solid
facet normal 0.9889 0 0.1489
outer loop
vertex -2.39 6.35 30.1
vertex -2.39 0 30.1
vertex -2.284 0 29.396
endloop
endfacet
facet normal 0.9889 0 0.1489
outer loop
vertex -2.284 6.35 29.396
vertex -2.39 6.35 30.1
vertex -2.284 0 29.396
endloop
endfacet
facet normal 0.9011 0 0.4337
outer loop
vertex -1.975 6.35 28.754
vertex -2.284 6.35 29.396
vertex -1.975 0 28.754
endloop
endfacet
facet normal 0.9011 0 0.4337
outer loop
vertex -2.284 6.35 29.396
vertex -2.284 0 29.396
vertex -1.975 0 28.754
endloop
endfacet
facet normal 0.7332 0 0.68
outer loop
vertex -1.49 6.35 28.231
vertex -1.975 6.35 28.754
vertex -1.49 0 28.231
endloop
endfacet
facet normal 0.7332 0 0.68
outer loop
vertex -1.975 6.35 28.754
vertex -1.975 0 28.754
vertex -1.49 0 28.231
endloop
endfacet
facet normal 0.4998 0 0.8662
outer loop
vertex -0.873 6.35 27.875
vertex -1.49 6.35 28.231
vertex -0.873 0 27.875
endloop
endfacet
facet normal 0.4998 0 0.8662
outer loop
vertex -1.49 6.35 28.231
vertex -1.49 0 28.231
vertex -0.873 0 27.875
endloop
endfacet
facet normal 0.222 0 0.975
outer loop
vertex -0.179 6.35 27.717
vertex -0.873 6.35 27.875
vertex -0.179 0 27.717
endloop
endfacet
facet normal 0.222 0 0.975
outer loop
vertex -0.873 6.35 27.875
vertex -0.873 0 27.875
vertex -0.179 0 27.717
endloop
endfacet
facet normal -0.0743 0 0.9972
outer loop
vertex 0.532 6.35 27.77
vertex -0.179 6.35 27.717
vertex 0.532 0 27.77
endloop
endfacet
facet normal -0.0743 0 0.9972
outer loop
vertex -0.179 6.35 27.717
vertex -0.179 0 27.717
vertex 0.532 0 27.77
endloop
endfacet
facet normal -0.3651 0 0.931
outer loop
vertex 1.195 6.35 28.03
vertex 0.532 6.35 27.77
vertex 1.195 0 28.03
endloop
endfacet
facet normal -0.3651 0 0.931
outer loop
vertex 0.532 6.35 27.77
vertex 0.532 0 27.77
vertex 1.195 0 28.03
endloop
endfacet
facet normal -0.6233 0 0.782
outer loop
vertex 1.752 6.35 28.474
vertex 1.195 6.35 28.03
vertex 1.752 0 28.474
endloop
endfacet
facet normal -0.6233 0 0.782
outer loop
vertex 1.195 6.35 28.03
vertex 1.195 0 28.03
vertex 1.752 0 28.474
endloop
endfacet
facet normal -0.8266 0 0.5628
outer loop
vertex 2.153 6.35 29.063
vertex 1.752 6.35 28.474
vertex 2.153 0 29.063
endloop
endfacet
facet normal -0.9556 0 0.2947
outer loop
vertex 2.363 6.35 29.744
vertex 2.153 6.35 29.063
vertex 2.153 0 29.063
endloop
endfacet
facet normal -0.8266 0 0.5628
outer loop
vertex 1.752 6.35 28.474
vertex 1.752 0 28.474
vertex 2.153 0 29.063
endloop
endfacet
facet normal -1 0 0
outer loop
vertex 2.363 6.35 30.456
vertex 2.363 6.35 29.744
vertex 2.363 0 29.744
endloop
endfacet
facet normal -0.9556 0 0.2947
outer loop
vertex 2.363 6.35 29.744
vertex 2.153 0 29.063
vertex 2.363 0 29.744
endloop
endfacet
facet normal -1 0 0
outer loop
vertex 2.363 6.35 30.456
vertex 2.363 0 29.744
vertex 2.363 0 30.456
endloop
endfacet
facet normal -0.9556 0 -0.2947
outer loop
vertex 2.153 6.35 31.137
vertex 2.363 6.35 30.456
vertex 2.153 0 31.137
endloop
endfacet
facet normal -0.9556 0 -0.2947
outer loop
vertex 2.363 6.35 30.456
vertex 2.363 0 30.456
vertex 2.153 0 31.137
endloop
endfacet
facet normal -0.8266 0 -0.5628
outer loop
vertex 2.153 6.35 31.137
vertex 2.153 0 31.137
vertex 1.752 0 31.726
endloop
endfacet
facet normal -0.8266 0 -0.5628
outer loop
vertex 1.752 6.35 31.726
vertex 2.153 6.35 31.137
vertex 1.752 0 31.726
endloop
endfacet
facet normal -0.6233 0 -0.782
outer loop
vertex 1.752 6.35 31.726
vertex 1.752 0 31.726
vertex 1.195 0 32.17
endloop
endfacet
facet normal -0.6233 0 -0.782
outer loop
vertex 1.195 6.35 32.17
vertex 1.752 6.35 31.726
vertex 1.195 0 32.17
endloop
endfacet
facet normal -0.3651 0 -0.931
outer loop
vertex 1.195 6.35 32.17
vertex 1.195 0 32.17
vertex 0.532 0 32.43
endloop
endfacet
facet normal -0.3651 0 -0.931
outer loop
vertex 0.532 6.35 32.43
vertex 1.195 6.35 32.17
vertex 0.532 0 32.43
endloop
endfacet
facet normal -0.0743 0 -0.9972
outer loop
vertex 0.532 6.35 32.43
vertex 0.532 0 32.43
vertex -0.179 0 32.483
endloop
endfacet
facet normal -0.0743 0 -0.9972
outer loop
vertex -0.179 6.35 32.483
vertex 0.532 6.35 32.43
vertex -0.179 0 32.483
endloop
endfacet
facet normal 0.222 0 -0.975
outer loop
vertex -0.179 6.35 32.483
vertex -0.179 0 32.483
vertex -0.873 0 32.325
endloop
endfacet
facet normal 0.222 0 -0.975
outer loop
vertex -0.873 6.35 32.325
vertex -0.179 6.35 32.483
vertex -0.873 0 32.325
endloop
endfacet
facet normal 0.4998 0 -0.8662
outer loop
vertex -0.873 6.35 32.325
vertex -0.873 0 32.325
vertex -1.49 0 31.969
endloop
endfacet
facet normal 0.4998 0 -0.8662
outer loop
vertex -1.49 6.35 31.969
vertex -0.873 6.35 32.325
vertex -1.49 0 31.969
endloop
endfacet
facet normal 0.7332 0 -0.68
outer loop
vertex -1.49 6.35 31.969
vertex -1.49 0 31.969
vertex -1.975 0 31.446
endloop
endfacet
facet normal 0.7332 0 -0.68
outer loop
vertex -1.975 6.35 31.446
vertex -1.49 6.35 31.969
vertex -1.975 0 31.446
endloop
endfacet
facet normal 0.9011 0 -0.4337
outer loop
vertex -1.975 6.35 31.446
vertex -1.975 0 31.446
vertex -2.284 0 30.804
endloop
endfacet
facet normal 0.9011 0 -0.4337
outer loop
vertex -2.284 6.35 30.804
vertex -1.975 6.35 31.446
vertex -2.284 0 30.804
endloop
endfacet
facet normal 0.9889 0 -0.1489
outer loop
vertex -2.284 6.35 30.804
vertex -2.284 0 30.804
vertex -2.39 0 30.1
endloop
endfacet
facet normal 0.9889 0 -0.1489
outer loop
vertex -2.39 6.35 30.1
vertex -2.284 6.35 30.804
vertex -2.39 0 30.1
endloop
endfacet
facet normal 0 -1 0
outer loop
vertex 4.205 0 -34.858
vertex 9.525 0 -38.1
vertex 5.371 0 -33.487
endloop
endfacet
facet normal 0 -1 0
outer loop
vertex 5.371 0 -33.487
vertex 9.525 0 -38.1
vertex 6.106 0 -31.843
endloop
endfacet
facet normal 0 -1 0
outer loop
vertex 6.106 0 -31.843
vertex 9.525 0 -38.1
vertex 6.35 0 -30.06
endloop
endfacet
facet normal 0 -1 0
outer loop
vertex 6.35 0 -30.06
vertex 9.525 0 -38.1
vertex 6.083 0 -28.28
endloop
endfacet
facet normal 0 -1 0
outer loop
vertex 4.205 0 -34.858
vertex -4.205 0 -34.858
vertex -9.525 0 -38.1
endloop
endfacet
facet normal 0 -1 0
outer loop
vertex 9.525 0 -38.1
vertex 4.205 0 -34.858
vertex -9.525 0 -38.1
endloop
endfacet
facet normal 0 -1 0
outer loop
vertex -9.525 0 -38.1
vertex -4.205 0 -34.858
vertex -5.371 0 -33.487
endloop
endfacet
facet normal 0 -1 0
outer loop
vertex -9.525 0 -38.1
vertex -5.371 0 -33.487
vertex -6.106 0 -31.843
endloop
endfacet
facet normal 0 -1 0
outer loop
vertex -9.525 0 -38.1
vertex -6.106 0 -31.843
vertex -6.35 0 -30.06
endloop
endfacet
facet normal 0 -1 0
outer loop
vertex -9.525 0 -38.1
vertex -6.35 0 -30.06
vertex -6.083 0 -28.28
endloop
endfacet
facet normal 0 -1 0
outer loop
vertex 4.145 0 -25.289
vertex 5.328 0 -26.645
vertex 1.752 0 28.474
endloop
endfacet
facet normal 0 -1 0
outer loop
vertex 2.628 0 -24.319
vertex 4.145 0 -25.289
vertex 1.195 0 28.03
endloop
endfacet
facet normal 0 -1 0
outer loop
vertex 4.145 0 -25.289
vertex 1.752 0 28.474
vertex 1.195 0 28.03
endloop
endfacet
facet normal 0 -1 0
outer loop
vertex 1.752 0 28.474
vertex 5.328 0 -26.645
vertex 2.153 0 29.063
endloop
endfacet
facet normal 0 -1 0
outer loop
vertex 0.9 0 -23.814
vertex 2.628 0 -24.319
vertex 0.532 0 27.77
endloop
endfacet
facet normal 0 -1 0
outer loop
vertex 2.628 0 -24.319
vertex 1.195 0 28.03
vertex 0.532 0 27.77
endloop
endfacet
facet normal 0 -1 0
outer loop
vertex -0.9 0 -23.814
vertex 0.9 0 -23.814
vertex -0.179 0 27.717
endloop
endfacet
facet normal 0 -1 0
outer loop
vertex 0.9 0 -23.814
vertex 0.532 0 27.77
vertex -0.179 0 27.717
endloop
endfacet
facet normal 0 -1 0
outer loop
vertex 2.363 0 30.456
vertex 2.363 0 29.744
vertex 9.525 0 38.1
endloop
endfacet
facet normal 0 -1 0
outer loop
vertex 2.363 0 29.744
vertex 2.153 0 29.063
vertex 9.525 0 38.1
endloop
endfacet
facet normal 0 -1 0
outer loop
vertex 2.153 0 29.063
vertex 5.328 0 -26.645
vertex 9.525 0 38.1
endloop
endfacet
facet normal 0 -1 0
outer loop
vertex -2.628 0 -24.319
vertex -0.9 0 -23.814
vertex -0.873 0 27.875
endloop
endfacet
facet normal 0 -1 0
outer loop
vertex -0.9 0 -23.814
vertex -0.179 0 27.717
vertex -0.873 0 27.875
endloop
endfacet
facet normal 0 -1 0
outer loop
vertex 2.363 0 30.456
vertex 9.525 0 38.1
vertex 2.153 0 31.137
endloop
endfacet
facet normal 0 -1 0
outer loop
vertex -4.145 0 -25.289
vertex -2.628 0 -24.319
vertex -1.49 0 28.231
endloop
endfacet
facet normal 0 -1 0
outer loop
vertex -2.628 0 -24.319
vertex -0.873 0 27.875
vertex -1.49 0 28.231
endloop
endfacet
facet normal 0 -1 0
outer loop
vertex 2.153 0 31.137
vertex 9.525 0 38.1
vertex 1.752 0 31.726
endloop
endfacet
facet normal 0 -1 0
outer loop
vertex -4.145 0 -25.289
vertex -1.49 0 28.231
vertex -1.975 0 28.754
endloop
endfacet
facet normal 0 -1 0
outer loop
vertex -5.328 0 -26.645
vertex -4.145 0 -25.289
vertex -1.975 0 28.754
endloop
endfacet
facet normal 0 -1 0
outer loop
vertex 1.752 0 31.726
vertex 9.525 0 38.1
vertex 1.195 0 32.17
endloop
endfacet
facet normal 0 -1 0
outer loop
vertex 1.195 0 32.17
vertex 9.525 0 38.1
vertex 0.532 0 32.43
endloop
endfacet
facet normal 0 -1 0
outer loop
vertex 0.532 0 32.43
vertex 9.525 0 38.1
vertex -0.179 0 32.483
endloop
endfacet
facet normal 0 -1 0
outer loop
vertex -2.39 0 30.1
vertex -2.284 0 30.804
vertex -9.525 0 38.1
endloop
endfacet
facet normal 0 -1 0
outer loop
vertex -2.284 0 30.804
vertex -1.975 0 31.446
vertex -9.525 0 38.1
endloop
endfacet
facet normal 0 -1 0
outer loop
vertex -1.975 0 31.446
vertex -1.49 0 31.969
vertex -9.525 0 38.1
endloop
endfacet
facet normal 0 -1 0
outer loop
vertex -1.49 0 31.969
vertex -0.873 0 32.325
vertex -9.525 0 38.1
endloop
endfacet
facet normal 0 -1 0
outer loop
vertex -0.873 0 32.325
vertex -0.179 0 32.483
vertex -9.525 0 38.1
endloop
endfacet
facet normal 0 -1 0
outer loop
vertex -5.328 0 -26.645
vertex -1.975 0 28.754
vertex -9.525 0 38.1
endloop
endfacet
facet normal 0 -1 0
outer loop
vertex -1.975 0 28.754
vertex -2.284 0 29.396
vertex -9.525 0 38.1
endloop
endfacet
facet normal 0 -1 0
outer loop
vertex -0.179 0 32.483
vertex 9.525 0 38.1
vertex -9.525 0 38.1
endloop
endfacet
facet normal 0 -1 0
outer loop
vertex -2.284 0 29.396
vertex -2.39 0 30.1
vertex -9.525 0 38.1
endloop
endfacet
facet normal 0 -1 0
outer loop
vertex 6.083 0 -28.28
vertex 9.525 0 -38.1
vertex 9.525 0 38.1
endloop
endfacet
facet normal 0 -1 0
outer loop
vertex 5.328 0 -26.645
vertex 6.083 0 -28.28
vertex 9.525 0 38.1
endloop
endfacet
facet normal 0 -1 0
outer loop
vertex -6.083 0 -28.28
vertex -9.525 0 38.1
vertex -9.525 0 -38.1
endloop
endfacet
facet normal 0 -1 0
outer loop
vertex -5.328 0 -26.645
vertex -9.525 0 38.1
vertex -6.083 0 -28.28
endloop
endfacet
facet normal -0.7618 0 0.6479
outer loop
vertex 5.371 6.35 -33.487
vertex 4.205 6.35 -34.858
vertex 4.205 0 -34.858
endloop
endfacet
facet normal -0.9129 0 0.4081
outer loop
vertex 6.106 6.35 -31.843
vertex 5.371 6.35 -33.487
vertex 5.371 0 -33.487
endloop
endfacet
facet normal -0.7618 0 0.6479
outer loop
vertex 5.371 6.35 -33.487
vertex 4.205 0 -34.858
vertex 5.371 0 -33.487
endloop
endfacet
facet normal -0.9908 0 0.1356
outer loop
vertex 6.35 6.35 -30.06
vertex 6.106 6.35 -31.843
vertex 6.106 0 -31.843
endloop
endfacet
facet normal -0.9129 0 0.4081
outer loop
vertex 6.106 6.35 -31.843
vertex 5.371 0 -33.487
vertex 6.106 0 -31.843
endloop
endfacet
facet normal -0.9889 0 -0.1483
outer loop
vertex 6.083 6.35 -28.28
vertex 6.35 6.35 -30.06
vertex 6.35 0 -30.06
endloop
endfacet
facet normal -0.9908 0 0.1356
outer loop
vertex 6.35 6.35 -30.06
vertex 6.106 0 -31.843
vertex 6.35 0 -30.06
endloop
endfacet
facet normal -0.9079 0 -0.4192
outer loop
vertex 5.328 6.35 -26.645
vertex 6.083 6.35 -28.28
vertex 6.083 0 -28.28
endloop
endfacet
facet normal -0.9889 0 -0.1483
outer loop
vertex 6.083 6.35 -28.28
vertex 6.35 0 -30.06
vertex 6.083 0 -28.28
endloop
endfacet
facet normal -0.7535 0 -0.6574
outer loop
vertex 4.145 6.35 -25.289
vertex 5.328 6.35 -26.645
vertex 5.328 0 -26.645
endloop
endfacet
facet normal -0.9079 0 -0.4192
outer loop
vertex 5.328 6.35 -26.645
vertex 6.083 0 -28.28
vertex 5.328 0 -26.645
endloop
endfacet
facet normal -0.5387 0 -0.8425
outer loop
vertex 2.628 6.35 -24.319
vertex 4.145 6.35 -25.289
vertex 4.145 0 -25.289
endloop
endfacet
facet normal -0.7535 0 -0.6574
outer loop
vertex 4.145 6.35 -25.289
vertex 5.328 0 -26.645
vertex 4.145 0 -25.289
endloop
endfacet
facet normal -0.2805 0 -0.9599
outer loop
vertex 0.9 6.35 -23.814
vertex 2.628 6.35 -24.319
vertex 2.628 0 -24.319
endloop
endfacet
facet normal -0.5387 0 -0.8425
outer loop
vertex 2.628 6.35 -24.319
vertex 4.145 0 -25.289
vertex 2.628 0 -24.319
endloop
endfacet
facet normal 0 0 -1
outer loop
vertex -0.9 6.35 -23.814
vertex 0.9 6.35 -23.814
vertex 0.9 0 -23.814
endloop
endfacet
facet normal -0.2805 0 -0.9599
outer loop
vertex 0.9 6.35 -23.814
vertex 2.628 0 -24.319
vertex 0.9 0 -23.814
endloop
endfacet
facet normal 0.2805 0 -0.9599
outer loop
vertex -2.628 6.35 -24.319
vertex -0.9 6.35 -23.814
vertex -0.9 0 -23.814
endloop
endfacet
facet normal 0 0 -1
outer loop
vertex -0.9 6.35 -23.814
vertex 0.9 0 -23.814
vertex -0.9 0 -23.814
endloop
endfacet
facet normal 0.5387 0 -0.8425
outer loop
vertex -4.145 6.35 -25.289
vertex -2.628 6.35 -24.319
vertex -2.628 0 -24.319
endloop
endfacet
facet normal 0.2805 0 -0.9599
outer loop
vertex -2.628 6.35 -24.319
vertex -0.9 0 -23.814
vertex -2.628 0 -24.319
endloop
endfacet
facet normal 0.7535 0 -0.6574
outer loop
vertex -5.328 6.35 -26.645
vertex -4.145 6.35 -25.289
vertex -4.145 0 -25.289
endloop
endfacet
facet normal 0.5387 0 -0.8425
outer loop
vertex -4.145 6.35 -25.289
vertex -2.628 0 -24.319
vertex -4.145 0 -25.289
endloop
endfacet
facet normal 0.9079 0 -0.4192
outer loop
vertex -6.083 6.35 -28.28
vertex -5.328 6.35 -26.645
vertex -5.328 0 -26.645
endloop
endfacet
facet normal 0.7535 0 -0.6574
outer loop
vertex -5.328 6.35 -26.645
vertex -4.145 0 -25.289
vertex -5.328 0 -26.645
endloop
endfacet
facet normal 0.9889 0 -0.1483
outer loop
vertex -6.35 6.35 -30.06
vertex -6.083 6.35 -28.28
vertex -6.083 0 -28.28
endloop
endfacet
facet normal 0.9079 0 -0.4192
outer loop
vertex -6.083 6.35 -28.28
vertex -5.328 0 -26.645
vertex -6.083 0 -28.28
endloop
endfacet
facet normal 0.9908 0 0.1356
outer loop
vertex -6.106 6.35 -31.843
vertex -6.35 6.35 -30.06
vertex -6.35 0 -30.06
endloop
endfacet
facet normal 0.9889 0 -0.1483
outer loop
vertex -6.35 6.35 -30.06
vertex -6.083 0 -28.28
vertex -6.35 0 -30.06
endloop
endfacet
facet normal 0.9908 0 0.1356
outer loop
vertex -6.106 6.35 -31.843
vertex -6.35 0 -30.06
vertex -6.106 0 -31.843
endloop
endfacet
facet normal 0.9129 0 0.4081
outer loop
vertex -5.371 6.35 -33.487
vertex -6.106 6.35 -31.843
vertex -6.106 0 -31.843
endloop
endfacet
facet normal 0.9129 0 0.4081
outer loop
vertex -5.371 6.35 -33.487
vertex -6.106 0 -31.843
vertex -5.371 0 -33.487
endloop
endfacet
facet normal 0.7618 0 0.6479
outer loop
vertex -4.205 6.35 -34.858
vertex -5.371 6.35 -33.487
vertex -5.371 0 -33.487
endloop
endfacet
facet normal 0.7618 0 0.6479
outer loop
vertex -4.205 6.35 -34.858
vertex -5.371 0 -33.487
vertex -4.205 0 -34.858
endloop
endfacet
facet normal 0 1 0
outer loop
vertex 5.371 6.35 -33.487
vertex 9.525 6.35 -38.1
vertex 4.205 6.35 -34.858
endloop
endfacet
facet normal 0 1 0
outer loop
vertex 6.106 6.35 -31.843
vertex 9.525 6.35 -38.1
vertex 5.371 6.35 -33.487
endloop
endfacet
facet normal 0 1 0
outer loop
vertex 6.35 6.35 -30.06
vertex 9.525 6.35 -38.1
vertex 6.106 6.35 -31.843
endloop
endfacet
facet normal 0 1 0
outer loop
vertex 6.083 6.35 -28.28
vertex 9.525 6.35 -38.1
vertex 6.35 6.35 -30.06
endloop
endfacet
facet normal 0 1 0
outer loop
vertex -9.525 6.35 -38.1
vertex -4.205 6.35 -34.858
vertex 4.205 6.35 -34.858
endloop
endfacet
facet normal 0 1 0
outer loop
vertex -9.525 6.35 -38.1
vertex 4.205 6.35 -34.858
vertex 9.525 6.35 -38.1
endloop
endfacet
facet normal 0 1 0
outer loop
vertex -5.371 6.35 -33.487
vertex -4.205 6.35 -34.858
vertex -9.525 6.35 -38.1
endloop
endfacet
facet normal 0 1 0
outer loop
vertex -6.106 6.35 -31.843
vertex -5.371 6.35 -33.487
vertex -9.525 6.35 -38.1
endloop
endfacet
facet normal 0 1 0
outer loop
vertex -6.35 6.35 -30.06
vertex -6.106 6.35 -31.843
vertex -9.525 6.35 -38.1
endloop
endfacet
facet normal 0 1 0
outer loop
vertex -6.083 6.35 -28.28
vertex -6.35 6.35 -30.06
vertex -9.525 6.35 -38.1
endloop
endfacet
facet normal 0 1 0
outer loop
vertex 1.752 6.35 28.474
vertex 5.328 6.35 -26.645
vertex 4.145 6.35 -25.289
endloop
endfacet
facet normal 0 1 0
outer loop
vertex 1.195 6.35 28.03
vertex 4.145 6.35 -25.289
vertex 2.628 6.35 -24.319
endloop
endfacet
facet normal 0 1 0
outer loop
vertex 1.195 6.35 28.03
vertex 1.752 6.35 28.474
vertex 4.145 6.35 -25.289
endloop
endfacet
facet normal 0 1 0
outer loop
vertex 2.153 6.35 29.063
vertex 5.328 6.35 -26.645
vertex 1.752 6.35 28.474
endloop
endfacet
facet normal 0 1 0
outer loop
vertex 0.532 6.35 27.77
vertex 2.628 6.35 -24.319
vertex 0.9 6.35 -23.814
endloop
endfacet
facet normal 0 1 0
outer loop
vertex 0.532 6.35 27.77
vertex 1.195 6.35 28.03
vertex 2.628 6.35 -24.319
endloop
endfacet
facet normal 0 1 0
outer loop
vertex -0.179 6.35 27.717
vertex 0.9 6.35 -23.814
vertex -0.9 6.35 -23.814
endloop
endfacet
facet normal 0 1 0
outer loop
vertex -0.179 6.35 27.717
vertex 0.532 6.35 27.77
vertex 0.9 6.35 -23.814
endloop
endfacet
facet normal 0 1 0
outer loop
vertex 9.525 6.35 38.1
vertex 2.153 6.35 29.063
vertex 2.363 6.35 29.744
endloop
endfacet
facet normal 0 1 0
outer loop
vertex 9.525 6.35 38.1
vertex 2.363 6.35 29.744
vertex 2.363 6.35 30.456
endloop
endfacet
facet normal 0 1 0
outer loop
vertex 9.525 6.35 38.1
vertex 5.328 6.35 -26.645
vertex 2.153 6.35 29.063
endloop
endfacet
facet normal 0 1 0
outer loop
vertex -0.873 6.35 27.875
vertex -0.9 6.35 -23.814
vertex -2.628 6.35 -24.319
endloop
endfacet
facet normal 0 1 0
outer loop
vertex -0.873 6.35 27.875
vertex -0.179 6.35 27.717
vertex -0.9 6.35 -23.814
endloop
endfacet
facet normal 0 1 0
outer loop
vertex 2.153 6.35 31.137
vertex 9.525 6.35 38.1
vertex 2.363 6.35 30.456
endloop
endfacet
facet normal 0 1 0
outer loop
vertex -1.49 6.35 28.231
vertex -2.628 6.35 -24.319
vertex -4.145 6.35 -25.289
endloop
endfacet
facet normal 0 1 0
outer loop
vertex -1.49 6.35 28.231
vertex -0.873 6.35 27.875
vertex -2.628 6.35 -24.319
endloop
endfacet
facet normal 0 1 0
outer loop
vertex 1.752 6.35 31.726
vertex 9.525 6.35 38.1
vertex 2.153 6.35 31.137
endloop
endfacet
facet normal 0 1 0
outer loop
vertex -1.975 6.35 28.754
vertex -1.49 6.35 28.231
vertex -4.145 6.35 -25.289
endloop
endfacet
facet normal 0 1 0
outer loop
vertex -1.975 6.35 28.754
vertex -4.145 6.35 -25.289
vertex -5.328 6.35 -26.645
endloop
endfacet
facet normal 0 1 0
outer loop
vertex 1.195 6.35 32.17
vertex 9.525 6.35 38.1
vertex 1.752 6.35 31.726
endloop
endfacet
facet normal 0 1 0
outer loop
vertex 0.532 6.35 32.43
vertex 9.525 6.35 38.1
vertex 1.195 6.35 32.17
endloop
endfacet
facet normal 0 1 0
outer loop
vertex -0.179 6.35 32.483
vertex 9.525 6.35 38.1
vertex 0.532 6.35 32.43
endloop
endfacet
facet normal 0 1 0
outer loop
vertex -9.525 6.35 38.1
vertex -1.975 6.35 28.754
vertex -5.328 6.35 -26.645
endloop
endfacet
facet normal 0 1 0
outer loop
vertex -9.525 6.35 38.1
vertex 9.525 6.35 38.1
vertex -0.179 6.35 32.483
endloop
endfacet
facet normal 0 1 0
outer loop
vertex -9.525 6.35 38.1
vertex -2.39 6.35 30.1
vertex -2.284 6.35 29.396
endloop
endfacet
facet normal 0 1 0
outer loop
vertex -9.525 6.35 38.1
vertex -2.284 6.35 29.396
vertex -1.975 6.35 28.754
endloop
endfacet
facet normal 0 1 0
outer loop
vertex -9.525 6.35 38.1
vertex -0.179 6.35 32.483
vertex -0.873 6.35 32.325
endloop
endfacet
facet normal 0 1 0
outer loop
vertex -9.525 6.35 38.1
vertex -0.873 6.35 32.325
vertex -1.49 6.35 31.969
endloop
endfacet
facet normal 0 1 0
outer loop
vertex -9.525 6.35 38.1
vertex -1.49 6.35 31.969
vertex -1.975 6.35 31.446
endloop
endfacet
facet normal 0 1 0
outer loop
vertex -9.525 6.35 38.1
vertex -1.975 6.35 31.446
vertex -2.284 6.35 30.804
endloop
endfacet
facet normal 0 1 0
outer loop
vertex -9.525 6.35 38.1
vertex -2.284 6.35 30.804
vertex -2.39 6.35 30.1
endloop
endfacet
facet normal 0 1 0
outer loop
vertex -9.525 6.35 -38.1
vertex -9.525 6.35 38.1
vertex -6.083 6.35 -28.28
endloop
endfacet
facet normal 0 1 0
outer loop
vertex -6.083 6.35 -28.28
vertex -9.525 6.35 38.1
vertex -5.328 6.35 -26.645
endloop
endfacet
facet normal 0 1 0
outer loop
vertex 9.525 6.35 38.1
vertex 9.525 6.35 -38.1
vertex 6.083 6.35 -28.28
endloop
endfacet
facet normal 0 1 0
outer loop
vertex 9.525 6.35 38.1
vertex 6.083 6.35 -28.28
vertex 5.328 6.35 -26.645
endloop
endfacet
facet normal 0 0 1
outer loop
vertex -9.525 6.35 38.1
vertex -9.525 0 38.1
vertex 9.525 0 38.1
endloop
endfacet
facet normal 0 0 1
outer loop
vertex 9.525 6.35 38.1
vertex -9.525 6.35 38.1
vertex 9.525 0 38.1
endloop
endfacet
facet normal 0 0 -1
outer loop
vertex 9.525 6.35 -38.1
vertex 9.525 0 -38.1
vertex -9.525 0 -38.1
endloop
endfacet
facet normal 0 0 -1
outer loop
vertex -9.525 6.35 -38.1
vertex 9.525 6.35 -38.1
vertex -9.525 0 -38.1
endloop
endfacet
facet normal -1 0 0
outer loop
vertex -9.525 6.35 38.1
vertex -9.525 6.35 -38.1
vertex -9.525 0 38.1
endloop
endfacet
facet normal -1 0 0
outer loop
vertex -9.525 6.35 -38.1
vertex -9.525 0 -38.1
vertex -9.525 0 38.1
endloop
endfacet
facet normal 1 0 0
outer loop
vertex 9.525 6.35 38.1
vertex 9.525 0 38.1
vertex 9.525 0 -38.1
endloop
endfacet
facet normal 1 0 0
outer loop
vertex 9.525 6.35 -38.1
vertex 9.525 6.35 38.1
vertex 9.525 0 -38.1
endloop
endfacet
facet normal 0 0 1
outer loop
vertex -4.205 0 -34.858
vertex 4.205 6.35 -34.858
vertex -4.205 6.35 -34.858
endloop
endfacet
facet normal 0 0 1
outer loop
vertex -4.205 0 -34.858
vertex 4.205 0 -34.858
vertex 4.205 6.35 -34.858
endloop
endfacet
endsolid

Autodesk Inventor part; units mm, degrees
ref_plane "YZ Plane" through (0, 0, 0) normal (1, 0, 0) x (0, 1, 0)
ref_plane "XZ Plane" through (0, 0, 0) normal (0, 1, 0) x (-1, 0, 0)
ref_plane "XY Plane" through (0, 0, 0) normal (0, 0, 1) x (1, 0, 0)
sketch "Esboço1" plane through (0, 0, 0) normal (0, 1, 0) x (-1, 0, 0)
  line L0 (9.525, 38.1) -> (-9.525, 38.1)
  line L1 (-9.525, 38.1) -> (-9.525, -38.1)
  line L2 (-9.525, -38.1) -> (9.525, -38.1)
  line L3 (9.525, -38.1) -> (9.525, 38.1)
  line L4 (9.525, 38.1) -> (-9.525, -38.1) construction
  line L5 (-9.525, 38.1) -> (9.525, -38.1) construction
  line L6 (0, -53.7953) -> (0, 49.8481)
  line L7 (-9.525, -38.1) -> (-9.525, -19.04) construction
  line L8 (-9.525, -19.04) -> (-9.525, 38.1) construction
  line L9 (0, -38.1) -> (0, -30.1) construction
  line L10 (0, 38.1) -> (0, 30.1) construction
  circle A0 centre (0, 30.1) radius 2.39
  arc A1 (4.205, -34.8582) -> (-4.205, -34.8582) centre (0, -30.1) ccw
  line L11 (-4.205, -34.8582) -> (4.205, -34.8582)
  point P0 (0, 0)
  dimension "d0" = 19.05
  dimension "d4" = 76.2
  dimension "d5" = 8
  dimension "d8" = 4.78
  dimension "d9" = 12.7
extrude "Extrusão1" add sketch "Esboço1" along normal blind 6.35 contours L3 L2 L6 L11 A1 A0 L0 | L6 A0 A1 L11 L2 L1 L0
properties part number "Virabrequim8"
